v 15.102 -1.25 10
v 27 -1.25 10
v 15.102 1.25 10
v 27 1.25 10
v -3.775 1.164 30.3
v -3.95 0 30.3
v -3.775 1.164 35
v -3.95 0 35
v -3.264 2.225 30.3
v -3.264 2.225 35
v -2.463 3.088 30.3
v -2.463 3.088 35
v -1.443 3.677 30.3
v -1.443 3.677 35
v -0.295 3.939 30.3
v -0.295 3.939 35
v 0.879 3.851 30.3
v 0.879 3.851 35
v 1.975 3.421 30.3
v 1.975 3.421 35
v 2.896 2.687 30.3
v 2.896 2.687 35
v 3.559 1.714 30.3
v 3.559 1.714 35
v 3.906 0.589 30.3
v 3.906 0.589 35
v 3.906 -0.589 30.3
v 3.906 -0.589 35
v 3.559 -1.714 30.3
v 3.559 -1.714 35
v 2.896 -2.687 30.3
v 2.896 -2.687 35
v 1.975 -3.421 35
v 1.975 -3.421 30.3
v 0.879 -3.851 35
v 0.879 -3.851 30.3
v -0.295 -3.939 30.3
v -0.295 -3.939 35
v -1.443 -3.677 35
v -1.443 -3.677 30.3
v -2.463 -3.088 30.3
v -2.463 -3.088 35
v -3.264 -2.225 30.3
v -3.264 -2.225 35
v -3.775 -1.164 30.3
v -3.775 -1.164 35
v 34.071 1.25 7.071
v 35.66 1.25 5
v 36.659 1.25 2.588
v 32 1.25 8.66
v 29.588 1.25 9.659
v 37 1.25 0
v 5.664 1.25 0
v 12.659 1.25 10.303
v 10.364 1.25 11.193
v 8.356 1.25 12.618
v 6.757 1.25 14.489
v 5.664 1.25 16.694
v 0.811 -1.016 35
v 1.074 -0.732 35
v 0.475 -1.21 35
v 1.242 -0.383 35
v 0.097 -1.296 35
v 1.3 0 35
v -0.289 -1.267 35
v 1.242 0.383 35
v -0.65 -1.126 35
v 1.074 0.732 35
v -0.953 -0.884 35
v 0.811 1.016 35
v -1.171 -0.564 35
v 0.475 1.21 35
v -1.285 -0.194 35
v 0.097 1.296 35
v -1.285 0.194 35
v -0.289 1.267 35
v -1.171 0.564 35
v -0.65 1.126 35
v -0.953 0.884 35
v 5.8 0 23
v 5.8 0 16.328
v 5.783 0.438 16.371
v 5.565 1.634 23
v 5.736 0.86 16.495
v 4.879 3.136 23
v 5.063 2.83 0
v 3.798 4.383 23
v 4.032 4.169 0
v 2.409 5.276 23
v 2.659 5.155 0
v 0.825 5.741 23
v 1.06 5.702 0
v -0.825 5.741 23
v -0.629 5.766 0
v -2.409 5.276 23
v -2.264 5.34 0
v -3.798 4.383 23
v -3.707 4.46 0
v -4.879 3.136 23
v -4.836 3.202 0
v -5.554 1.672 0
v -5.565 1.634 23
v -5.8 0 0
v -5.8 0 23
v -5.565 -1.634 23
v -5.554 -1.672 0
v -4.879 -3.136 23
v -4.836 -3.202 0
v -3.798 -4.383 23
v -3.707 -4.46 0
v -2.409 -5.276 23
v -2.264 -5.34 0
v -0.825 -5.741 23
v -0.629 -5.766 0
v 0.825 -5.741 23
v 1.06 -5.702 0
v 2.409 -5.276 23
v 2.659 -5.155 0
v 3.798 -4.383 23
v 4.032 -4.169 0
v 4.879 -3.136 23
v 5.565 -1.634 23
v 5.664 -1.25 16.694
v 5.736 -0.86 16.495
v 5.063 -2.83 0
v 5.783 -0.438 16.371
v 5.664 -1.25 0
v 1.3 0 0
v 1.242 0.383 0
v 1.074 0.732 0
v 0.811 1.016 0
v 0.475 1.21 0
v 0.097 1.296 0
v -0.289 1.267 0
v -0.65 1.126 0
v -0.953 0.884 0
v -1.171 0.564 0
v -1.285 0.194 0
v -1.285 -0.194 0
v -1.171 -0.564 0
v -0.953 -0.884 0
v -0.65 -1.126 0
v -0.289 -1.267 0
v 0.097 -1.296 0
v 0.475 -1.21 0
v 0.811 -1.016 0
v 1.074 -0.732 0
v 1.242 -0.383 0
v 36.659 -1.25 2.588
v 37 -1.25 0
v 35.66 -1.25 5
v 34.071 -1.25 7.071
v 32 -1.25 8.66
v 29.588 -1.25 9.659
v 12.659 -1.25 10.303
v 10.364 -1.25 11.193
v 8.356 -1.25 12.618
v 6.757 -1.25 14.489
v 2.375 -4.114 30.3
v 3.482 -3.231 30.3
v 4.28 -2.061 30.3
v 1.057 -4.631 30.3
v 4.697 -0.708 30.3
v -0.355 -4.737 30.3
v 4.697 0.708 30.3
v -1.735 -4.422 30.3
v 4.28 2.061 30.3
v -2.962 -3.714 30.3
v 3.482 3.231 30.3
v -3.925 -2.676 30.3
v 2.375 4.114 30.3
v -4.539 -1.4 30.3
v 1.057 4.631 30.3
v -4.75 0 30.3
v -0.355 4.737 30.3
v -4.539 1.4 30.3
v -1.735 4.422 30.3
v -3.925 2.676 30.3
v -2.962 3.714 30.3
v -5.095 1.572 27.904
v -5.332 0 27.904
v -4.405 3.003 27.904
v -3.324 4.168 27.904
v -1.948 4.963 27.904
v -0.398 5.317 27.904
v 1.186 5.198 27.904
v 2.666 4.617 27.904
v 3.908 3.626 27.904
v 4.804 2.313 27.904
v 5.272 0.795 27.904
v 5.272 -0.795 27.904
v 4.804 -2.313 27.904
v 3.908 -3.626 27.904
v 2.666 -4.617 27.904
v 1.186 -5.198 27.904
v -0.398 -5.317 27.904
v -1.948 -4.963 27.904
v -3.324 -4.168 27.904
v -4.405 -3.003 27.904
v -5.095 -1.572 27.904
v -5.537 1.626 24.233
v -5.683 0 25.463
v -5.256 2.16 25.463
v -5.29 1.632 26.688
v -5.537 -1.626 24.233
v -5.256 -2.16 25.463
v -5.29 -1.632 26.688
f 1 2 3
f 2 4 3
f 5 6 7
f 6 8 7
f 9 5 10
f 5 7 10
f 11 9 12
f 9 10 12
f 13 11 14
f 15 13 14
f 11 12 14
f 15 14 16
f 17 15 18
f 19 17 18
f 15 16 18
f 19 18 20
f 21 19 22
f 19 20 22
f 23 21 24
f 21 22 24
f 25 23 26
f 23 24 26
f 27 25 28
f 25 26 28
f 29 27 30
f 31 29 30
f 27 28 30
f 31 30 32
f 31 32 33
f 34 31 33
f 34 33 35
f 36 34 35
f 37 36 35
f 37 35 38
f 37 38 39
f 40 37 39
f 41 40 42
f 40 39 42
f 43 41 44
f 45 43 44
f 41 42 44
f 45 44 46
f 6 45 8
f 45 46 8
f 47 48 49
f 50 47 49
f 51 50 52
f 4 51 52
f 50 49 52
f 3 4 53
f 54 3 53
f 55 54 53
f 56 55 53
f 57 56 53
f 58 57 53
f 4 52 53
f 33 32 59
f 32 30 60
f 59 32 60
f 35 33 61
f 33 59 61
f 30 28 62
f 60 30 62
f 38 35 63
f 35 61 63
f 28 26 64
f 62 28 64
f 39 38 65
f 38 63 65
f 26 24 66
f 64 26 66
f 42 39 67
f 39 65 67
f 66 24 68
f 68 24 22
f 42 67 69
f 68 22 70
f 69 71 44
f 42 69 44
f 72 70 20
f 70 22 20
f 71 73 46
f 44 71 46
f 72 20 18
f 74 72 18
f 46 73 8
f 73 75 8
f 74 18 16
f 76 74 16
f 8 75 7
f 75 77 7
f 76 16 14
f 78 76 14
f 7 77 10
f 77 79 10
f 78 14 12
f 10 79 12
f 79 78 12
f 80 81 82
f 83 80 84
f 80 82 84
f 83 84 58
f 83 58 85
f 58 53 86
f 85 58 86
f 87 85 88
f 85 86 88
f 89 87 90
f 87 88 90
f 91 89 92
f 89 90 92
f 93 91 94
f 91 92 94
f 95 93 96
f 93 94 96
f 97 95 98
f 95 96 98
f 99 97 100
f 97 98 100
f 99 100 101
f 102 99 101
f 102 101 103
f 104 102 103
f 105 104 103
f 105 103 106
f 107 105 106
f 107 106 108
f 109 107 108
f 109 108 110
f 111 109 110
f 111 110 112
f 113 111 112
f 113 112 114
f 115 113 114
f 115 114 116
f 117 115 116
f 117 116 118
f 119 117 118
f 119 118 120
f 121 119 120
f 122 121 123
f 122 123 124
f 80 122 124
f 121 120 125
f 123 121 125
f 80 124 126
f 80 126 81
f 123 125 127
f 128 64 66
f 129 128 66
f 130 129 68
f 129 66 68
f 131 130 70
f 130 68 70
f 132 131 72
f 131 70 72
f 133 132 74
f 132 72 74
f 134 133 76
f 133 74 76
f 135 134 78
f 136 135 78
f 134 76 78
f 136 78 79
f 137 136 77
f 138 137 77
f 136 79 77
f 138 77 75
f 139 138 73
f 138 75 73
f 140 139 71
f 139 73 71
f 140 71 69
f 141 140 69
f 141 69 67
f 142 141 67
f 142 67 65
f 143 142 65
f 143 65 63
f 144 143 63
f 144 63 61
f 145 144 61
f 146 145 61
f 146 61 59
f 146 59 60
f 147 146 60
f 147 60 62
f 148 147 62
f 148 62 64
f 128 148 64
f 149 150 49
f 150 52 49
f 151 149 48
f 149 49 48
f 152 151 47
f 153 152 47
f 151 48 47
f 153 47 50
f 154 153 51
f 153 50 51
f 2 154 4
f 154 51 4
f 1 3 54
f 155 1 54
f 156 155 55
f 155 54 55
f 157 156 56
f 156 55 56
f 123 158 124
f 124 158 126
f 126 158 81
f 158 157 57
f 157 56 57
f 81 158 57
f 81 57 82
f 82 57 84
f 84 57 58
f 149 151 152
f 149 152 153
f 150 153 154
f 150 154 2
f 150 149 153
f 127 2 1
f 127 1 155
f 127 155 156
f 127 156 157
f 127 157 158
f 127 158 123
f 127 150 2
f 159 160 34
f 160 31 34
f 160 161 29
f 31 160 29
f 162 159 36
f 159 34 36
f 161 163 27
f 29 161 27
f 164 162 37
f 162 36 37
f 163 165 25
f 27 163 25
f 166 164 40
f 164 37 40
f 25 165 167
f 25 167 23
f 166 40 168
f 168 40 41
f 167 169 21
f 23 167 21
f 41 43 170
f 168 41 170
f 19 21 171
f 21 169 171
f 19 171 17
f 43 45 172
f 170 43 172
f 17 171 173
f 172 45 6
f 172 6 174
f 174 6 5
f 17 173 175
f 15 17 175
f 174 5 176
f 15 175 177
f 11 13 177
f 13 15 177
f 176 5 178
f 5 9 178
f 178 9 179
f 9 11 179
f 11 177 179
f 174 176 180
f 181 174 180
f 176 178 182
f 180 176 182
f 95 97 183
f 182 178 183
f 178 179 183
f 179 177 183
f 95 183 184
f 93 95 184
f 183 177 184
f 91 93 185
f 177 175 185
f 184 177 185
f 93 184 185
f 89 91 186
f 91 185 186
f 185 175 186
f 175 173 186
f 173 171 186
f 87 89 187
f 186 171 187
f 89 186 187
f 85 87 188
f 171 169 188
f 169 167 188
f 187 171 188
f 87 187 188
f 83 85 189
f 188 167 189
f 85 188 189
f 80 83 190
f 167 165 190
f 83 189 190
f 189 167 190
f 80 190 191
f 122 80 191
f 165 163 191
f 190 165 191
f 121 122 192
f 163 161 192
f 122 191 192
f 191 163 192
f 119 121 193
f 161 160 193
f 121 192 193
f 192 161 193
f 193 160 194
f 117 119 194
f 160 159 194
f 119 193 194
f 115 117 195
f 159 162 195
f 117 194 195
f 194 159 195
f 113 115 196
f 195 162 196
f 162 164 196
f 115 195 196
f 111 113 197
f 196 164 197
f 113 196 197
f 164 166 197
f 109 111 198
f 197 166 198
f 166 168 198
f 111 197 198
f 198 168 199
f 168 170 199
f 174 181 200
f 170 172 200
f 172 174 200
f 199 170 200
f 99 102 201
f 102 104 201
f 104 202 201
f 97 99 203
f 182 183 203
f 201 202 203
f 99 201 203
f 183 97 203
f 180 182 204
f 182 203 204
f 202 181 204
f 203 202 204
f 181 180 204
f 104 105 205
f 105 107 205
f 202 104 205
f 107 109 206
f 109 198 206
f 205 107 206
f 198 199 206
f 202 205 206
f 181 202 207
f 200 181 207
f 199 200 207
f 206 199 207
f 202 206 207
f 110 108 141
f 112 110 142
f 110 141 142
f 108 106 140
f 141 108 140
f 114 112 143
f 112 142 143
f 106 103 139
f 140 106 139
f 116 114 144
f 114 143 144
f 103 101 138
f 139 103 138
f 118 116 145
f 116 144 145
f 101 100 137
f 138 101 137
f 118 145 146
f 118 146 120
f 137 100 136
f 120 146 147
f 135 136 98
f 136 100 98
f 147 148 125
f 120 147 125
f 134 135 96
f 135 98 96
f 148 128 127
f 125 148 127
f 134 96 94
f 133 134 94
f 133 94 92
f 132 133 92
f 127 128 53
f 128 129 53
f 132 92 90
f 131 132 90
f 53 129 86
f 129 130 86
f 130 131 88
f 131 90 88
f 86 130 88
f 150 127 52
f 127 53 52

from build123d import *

# Parameters (mm, degrees)
SKETCH1_R           = 5.8
BOSS_EXTRUDE1_DEPTH = 23
BOSS_EXTRUDE2_DEPTH = 1.25
SKETCH4_R           = 1.3
CUT_EXTRUDE1_DEPTH  = 36.0000001


with BuildPart() as part:
    # Sketch1 → Boss-Extrude1 (new body)
    with BuildSketch(Plane.XY):
        Circle(SKETCH1_R)
    extrude(amount=BOSS_EXTRUDE1_DEPTH)

    # Sketch2 → Boss-Extrude2 (add, symmetric)
    with BuildSketch(Plane(origin=(0, 0, 0), x_dir=(1, 0, 0), z_dir=(0, 1, 0))):
        with BuildLine():
            Line((0, 0), (37, 0))
            ThreePointArc((37, 0), (34.071067812, -7.071067812), (27, -10))
            Line((27, -10), (15.101535324, -10))
            ThreePointArc((15.101535324, -10), (8.030467512, -12.928932188), (5.101535324, -20))
            Line((5.101535324, -20), (0, -20))
            Line((0, -20), (0, 0))
        make_face()
    extrude(amount=BOSS_EXTRUDE2_DEPTH, both=True)

    # Sketch3 → Revolve1 (revolve)
    with BuildSketch(Plane(origin=(0, 0, 0), x_dir=(1, 0, 0), z_dir=(0, 1, 0))):
        with BuildLine():
            Line((0, -23), (-5.8, -23))
            ThreePointArc((-5.8, -23), (-5.536156171, -26.687563559), (-4.75, -30.3))
            Line((-4.75, -30.3), (-3.95, -30.3))
            Line((-3.95, -30.3), (-3.95, -35))
            Line((-3.95, -35), (0, -35))
            Line((0, -35), (0, -23))
        make_face()
    revolve(axis=Axis((0, 0, 1000), (0, 0, -1)))

    # Sketch4 → Cut-Extrude1 (cut, through all)
    with BuildSketch(Plane.XY.offset(35)):
        Circle(SKETCH4_R)
    extrude(amount=-CUT_EXTRUDE1_DEPTH, mode=Mode.SUBTRACT)


solid = part.part
